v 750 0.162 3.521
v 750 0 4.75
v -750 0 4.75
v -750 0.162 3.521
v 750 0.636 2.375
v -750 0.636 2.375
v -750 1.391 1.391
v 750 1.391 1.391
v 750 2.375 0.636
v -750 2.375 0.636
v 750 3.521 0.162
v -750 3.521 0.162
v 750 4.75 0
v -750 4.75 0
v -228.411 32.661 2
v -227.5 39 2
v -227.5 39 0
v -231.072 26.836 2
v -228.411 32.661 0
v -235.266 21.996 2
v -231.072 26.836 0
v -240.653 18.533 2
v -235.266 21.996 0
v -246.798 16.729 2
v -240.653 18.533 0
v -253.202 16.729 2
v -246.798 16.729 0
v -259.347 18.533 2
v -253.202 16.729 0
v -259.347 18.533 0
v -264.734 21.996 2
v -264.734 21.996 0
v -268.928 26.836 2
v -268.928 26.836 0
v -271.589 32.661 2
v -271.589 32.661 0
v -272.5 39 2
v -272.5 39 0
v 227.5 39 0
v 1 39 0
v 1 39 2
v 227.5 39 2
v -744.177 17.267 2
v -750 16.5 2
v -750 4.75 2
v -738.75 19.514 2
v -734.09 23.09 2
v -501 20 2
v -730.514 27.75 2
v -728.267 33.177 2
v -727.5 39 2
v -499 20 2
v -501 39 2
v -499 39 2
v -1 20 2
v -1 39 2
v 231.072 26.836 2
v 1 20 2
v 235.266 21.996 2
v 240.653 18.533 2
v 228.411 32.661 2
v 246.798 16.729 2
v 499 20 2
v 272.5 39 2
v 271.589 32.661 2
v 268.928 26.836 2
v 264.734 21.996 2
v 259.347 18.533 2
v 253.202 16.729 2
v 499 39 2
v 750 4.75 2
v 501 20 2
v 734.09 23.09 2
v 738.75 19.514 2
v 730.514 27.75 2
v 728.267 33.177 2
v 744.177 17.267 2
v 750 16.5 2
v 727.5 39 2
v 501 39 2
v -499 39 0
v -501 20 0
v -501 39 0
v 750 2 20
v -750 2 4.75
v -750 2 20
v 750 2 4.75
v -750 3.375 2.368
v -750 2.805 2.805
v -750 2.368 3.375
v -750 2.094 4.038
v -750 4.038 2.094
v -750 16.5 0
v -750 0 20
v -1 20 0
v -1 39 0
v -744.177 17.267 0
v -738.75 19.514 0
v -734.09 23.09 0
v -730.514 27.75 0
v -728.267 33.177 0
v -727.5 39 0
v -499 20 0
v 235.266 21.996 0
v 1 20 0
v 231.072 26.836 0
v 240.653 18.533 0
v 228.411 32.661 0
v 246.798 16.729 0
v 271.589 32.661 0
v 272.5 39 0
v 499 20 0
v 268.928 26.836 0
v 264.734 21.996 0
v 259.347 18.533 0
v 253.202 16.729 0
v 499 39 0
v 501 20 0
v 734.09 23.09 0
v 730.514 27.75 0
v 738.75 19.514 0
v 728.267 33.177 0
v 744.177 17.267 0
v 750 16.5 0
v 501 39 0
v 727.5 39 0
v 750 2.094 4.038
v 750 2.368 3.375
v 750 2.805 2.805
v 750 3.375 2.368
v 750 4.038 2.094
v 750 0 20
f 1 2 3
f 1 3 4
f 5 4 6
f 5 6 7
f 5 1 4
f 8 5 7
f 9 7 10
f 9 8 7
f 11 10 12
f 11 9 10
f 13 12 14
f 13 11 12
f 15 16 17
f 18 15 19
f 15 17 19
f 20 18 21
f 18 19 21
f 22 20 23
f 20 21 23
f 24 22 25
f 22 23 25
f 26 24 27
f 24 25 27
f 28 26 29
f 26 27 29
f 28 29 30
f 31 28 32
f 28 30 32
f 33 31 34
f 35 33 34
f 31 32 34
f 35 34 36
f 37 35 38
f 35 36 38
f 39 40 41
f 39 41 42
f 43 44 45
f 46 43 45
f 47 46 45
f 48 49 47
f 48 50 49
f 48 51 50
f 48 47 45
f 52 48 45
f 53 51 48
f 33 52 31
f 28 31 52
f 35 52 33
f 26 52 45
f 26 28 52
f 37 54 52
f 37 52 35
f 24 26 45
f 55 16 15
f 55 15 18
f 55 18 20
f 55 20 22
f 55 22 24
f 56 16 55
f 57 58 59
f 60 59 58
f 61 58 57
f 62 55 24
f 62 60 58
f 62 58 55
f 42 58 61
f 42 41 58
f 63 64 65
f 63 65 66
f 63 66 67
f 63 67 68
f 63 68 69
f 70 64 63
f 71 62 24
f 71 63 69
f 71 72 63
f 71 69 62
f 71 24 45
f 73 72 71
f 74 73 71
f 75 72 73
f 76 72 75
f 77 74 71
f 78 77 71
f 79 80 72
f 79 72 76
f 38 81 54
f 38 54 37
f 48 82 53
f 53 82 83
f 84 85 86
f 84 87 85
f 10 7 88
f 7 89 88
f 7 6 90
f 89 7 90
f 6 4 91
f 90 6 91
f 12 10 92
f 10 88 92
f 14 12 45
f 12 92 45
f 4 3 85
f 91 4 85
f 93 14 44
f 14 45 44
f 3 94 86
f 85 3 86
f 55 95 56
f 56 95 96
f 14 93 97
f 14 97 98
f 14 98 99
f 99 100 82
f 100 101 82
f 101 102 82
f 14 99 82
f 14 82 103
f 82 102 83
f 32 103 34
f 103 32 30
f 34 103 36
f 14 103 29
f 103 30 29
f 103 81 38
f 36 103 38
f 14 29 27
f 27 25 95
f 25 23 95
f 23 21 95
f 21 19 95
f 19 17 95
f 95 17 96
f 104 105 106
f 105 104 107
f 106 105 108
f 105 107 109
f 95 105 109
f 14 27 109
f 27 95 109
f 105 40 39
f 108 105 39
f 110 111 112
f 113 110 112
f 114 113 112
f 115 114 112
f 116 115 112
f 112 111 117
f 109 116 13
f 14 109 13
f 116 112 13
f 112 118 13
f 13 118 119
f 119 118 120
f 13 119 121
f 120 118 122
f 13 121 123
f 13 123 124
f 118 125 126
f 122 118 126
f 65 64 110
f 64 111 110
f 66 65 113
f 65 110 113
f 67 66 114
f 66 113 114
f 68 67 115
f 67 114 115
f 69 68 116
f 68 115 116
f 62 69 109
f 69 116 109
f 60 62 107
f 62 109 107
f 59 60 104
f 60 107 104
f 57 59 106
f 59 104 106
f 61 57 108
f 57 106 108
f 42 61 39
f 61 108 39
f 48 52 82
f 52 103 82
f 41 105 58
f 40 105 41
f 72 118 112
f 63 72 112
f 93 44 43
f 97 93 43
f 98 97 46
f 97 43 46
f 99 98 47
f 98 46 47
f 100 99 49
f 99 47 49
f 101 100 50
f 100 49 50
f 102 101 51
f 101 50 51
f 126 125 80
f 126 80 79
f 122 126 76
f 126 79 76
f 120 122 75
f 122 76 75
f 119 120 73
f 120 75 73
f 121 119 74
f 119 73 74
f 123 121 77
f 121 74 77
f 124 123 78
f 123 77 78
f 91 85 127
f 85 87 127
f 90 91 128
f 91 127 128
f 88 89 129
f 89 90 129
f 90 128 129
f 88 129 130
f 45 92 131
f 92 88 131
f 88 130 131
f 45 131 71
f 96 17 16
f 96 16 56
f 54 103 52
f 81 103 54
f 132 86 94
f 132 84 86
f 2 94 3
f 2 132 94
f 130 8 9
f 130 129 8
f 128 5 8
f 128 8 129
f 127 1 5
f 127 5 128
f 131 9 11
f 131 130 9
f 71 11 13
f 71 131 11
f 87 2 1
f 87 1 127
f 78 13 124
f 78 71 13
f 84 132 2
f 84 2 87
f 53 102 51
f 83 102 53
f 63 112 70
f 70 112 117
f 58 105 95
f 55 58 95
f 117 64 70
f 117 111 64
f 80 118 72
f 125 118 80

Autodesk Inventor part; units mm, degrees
ref_plane "YZ Plane" through (0, 0, 0) normal (1, 0, 0) x (0, 1, 0)
ref_plane "XZ Plane" through (0, 0, 0) normal (0, 1, 0) x (-1, 0, 0)
ref_plane "XY Plane" through (0, 0, 0) normal (0, 0, 1) x (1, 0, 0)
sketch "Sketch1" plane through (0, 0, 0) normal (0, 0, 1) x (1, 0, 0)
  line L0 (-750, 39) -> (750, 39)
  line L1 (750, 39) -> (750, 0)
  line L2 (750, 0) -> (-750, 0)
  line L3 (-750, 0) -> (-750, 39)
  point P0 (0, 0)
  point P1 (0, 0)
  dimension "d0" = 1500
  dimension "d1" = 39
extrude "Plate1" add sketch "Sketch1" along normal blind 2
sketch "Sketch2" plane through (750, 2, 0) normal (0, -1, 0) x (1, 0, 0)
  line L0 (-1500, 0) -> (0, 0)
  line L1 (0, 0) -> (0, 20)
  line L2 (0, 20) -> (-1500, 20)
  line L3 (-1500, 20) -> (-1500, 0)
edge flange "Flange1" height 20 angle 90 thickness 2 bend radius 2.75 thickness toward (0, -1, 0) relief round relief width 2 relief depth 1 edges at (0, 0, 2) wall of the first edge with corners at (-750, 2, 0) (750, 2, 0) (750, 2, 20) (-750, 2, 20)
bend "Bend1"
corner "Corner1"
sketch "Sketch5" plane through (0, 0, 0) normal (0, 0, -1) x (-1, 0, 0)
  line L0 (750, 39) -> (-750, 39) projected
  line L1 (-1, 20) -> (-1, 39)
  line L2 (750, 0) -> (-750, 0) projected
  line L3 (-1, 20) -> (1, 20)
  line L4 (1, 20) -> (1, 39)
  point P0 (0, 0)
  point P1 (0, 20)
  point P2 (0, 0)
  dimension "d27" = 2
  dimension "d28" = 20
extrude "Extrusion1" cut sketch "Sketch5" against normal through all
pattern_linear "Rectangular Pattern1" count 3 spacing 500 along (1, 0, 0) of "Extrusion1" first direction both ways yes
sketch "Sketch6" plane through (0, 0, 0) normal (0, 0, -1) x (-1, 0, 0)
  line L0 (-750, 39) -> (-750, 4.75) projected
  circle A0 centre (-750, 39) radius 22.5
  line L1 (-750, 39) -> (750, 39) projected
  line L2 (-1, 39) -> (-1, 20) projected
  line L3 (-499, 39) -> (-499, 20) projected
  line L4 (-1, 20) -> (-499, 20) construction
  circle A1 centre (-250, 39) radius 22.5
  point P0 (0, 0)
  point P1 (-727.5, 39)
  point P2 (-750, 16.5)
  point P3 (-250, 20)
  dimension "d24" = 45
extrude "Extrusion2" cut sketch "Sketch6" along normal mid plane 30 contours L1 A0 L0 | A1 L1 | L1 A1 picked at (-748.3311, 24.188)
mirror "Mirror1" about plane through (0, 0, 0) normal (1, 0, 0) of "Extrusion2"
sketch "Sketch7" plane through (0, 0, 2) normal (0, 0, 1) x (1, 0, 0)
  arc A0 (-750, 16.5) -> (-727.5, 39) centre (-750, 39) ccw projected
  line L0 (-750, 4.75) -> (-750, 16.5) projected
  line L1 (-750, 4.75) -> (750, 4.75) projected
  line L2 (750, 16.5) -> (750, 4.75) projected
  arc A1 (727.5, 39) -> (750, 16.5) centre (750, 39) ccw projected
  line L3 (501, 39) -> (727.5, 39) projected
  line L4 (501, 39) -> (501, 20) projected
  line L5 (501, 20) -> (499, 20) projected
  line L6 (499, 20) -> (499, 39) projected
  line L7 (1, 39) -> (227.5, 39) projected
  line L8 (1, 39) -> (1, 20) projected
  line L9 (1, 20) -> (-1, 20) projected
  line L10 (-1, 20) -> (-1, 39) projected
  line L11 (-499, 39) -> (-272.5, 39) projected
  line L12 (-499, 39) -> (-499, 20) projected
  line L13 (-499, 20) -> (-501, 20) projected
  line L14 (-501, 20) -> (-501, 39) projected
  line L15 (-727.5, 39) -> (-501, 39) projected
  line L16 (650, 4.75) -> (650, 39) construction
  line L17 (-750, 4.75) -> (750, 4.75) projected
  circle A2 centre (650, 21.875) radius 5
  circle A3 centre (630, 21.875) radius 5
  line L18 (272.5, 39) -> (499, 39) projected
  arc A4 (227.5, 39) -> (272.5, 39) centre (250, 39) ccw projected
  line L19 (-227.5, 39) -> (-1, 39) projected
  arc A5 (-272.5, 39) -> (-227.5, 39) centre (-250, 39) ccw projected
  point P0 (0, 0)
  dimension "d29" = 100
  dimension "d30" = 10
  dimension "d31" = 10
  dimension "d32" = 20
extrude "Extrusion3" [suppressed]
mirror "Mirror2" [suppressed]
sketch "Sketch8" plane through (0, 0, 2) normal (0, 0, 1) x (1, 0, 0)
  line L0 (494, 34) -> (494, 22) construction
  line L1 (494, 22) -> (294, 22) construction
  line L2 (294, 22) -> (294, 34) construction
  line L3 (294, 34) -> (494, 34) construction
  line L4 (501, 39) -> (727.5, 39) projected
  line L5 (272.5, 39) -> (499, 39) projected
  point P0 (0, 0)
  dimension "d35" = 200
  dimension "d36" = 12
  dimension "d39" = 5
  dimension "d40" = 5
mark "Mark1"
equation "\"d28\" = РЕБРА_полка"
equation "\"d1\" = БОРТ_стрингер_4_высота"
equation "\"d27\" = d18"
equation "\"d2\" = Thickness"
equation "\"d3\" = BendReliefWidth"
equation "\"d4\" = BendReliefDepth"
equation "\"d5\" = MinimumRemnant"
equation "\"d6\" = TransitionRadius"
equation "\"d9\" = BendRadius"
equation "\"d10\" = CornerReliefSize"
equation "\"d11\" = GapSize"
equation "\"d12\" = JacobiRadiusSize"
equation "\"BendReliefWidth\" = Thickness"
equation "\"BendReliefDepth\" = 0.5 * Thickness"
equation "\"CornerReliefSize\" = 4 * Thickness"
equation "\"MinimumRemnant\" = 2 * Thickness"
equation "\"TransitionRadius\" = BendRadius"
equation "\"JacobiRadiusSize\" = BendRadius"
equation "\"GapSize\" = Thickness"
equation "\"d18\" = Thickness"
equation "\"БОРТ_стрингер_4_высота\" = 39"
equation "\"Thickness\" = 2"
equation "\"BendRadius\" = 2.75"
equation "\"РЕБРА_полка\" = 20"
properties part number "MSC 317 stringer board ##" material "Stainless Steel"
